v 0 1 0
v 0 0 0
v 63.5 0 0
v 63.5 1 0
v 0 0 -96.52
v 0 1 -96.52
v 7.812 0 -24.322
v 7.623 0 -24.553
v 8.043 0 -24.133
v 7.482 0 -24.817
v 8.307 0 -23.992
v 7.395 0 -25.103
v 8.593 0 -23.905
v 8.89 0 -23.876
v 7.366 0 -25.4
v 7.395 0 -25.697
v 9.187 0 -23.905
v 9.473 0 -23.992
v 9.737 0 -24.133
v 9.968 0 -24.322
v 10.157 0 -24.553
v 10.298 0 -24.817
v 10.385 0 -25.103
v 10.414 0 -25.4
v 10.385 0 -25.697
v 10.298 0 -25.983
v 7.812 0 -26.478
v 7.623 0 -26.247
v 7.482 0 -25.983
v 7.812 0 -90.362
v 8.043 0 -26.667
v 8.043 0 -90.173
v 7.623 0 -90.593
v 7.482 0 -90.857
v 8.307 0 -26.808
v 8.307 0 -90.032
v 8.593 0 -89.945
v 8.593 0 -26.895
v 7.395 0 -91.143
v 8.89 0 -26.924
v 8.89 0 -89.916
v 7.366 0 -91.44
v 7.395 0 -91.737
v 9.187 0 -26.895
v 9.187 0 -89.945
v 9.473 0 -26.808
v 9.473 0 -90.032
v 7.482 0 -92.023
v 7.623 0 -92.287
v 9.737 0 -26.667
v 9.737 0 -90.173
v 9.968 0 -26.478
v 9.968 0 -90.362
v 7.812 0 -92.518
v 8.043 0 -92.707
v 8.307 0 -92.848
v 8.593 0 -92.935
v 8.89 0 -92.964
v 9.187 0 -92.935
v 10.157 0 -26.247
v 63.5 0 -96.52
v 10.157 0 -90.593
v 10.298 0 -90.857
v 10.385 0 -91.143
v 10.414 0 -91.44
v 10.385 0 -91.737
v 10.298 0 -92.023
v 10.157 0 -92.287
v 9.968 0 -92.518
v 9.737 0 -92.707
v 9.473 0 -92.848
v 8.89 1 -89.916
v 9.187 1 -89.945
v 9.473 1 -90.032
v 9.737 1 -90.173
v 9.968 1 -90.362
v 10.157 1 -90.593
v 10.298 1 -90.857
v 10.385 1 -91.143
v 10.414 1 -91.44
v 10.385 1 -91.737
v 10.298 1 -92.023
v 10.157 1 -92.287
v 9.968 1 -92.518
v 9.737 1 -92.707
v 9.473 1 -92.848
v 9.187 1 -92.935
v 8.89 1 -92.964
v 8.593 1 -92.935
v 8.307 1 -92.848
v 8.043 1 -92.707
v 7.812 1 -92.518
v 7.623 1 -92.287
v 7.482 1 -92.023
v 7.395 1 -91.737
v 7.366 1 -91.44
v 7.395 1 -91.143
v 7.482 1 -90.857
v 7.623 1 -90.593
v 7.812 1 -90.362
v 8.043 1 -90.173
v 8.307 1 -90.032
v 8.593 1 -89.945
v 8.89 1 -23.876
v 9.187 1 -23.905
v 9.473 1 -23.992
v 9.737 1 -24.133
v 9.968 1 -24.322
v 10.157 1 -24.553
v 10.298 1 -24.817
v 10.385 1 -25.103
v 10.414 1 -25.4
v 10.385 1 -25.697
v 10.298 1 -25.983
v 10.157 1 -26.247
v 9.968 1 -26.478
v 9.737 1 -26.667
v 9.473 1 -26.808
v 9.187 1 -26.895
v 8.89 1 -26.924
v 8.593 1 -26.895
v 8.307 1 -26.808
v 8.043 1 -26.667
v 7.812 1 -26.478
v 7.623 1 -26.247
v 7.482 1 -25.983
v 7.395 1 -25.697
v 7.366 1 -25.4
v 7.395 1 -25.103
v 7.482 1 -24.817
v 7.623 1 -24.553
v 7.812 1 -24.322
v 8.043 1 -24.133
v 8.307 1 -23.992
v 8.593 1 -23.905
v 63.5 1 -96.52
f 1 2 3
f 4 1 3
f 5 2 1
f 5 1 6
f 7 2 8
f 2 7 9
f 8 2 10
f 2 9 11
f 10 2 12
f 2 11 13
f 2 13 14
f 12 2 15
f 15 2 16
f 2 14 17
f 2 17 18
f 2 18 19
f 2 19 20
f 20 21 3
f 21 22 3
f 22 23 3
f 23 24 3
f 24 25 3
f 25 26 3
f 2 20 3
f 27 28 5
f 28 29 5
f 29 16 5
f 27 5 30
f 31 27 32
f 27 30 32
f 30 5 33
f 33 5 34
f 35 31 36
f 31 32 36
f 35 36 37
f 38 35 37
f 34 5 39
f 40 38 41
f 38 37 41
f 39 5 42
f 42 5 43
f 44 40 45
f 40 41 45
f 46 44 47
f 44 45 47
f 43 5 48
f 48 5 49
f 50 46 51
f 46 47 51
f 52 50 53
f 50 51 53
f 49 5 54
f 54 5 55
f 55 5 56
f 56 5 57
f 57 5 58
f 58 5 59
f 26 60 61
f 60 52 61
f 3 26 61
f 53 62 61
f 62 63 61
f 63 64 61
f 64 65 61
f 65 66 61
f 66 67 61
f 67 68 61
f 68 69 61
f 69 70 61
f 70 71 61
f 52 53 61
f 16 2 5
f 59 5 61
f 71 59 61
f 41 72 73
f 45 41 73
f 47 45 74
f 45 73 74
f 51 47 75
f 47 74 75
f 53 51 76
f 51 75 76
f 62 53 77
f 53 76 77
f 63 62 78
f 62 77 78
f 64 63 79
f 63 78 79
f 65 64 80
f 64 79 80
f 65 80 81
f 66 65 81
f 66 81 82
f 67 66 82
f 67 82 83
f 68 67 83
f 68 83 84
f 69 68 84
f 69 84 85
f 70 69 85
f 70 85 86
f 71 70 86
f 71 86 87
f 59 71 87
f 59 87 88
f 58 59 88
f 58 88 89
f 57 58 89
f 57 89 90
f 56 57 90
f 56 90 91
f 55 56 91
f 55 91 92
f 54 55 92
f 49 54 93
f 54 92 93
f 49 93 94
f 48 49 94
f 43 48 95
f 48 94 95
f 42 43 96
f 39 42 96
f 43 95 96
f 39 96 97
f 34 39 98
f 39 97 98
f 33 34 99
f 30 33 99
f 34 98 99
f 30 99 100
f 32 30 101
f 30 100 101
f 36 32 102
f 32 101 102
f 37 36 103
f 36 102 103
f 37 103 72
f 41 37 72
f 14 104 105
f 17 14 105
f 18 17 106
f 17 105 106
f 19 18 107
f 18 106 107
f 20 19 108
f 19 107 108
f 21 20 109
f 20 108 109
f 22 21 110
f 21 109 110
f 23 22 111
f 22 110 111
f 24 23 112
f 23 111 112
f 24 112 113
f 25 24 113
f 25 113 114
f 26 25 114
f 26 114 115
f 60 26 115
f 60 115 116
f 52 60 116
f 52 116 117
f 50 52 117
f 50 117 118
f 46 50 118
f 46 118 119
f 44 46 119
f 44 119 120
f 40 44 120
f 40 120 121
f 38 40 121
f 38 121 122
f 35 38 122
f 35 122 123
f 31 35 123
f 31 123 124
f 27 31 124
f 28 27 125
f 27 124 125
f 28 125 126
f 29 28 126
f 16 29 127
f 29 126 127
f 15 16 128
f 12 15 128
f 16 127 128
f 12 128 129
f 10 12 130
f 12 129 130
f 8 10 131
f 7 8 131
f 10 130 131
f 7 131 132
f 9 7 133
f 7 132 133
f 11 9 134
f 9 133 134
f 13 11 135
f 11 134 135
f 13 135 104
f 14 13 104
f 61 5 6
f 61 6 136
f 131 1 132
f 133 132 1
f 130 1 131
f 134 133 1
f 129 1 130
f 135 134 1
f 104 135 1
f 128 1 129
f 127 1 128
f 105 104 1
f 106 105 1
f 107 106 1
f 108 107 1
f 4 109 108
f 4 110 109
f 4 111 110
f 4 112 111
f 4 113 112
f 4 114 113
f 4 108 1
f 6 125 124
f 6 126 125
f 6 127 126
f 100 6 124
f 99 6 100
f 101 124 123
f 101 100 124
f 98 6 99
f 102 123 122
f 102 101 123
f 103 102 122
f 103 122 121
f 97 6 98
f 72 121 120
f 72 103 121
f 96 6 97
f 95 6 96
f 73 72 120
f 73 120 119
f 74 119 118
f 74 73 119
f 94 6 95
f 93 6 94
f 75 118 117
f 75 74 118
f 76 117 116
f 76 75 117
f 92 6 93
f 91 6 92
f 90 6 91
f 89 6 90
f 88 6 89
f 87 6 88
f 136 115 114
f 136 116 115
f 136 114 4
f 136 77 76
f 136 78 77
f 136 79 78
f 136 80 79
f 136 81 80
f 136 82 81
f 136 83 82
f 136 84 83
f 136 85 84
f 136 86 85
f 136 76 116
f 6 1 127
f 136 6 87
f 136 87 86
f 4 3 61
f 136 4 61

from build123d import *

# Parameters (mm, degrees)
SKETCH1_W              = 63.5
SKETCH1_H              = 96.52
BOSS_EXTRUDE1_DEPTH    = 1
SKETCH2_R              = 1.524
MOUNTING_HOLES_1_DEPTH = 2
SKETCH3_R              = 1.524
MOUNTING_HOLES_2_DEPTH = 3


with BuildPart() as part:
    # Sketch1 → Boss-Extrude1 (new body)
    with BuildSketch(Plane(origin=(0, 0, 0), x_dir=(1, 0, 0), z_dir=(0, 1, 0))):
        with Locations((31.75, 48.26)):
            Rectangle(SKETCH1_W, SKETCH1_H)
    extrude(amount=BOSS_EXTRUDE1_DEPTH)

    # Sketch2 → mounting holes (1) (cut)
    with BuildSketch(Plane(origin=(0, 1, 0), x_dir=(1, 0, 0), z_dir=(0, 1, 0))):
        with Locations(Location((8.89, 91.44, 0), (0, 0, 270))):
            Circle(SKETCH2_R)
    extrude(amount=-MOUNTING_HOLES_1_DEPTH, mode=Mode.SUBTRACT)

    # Sketch3 → mounting holes (2) (cut)
    with BuildSketch(Plane(origin=(0, 1, 0), x_dir=(1, 0, 0), z_dir=(0, 1, 0))):
        with Locations(Location((8.89, 25.4, 0), (0, 0, 270))):
            Circle(SKETCH3_R)
    extrude(amount=-MOUNTING_HOLES_2_DEPTH, mode=Mode.SUBTRACT)


solid = part.part
